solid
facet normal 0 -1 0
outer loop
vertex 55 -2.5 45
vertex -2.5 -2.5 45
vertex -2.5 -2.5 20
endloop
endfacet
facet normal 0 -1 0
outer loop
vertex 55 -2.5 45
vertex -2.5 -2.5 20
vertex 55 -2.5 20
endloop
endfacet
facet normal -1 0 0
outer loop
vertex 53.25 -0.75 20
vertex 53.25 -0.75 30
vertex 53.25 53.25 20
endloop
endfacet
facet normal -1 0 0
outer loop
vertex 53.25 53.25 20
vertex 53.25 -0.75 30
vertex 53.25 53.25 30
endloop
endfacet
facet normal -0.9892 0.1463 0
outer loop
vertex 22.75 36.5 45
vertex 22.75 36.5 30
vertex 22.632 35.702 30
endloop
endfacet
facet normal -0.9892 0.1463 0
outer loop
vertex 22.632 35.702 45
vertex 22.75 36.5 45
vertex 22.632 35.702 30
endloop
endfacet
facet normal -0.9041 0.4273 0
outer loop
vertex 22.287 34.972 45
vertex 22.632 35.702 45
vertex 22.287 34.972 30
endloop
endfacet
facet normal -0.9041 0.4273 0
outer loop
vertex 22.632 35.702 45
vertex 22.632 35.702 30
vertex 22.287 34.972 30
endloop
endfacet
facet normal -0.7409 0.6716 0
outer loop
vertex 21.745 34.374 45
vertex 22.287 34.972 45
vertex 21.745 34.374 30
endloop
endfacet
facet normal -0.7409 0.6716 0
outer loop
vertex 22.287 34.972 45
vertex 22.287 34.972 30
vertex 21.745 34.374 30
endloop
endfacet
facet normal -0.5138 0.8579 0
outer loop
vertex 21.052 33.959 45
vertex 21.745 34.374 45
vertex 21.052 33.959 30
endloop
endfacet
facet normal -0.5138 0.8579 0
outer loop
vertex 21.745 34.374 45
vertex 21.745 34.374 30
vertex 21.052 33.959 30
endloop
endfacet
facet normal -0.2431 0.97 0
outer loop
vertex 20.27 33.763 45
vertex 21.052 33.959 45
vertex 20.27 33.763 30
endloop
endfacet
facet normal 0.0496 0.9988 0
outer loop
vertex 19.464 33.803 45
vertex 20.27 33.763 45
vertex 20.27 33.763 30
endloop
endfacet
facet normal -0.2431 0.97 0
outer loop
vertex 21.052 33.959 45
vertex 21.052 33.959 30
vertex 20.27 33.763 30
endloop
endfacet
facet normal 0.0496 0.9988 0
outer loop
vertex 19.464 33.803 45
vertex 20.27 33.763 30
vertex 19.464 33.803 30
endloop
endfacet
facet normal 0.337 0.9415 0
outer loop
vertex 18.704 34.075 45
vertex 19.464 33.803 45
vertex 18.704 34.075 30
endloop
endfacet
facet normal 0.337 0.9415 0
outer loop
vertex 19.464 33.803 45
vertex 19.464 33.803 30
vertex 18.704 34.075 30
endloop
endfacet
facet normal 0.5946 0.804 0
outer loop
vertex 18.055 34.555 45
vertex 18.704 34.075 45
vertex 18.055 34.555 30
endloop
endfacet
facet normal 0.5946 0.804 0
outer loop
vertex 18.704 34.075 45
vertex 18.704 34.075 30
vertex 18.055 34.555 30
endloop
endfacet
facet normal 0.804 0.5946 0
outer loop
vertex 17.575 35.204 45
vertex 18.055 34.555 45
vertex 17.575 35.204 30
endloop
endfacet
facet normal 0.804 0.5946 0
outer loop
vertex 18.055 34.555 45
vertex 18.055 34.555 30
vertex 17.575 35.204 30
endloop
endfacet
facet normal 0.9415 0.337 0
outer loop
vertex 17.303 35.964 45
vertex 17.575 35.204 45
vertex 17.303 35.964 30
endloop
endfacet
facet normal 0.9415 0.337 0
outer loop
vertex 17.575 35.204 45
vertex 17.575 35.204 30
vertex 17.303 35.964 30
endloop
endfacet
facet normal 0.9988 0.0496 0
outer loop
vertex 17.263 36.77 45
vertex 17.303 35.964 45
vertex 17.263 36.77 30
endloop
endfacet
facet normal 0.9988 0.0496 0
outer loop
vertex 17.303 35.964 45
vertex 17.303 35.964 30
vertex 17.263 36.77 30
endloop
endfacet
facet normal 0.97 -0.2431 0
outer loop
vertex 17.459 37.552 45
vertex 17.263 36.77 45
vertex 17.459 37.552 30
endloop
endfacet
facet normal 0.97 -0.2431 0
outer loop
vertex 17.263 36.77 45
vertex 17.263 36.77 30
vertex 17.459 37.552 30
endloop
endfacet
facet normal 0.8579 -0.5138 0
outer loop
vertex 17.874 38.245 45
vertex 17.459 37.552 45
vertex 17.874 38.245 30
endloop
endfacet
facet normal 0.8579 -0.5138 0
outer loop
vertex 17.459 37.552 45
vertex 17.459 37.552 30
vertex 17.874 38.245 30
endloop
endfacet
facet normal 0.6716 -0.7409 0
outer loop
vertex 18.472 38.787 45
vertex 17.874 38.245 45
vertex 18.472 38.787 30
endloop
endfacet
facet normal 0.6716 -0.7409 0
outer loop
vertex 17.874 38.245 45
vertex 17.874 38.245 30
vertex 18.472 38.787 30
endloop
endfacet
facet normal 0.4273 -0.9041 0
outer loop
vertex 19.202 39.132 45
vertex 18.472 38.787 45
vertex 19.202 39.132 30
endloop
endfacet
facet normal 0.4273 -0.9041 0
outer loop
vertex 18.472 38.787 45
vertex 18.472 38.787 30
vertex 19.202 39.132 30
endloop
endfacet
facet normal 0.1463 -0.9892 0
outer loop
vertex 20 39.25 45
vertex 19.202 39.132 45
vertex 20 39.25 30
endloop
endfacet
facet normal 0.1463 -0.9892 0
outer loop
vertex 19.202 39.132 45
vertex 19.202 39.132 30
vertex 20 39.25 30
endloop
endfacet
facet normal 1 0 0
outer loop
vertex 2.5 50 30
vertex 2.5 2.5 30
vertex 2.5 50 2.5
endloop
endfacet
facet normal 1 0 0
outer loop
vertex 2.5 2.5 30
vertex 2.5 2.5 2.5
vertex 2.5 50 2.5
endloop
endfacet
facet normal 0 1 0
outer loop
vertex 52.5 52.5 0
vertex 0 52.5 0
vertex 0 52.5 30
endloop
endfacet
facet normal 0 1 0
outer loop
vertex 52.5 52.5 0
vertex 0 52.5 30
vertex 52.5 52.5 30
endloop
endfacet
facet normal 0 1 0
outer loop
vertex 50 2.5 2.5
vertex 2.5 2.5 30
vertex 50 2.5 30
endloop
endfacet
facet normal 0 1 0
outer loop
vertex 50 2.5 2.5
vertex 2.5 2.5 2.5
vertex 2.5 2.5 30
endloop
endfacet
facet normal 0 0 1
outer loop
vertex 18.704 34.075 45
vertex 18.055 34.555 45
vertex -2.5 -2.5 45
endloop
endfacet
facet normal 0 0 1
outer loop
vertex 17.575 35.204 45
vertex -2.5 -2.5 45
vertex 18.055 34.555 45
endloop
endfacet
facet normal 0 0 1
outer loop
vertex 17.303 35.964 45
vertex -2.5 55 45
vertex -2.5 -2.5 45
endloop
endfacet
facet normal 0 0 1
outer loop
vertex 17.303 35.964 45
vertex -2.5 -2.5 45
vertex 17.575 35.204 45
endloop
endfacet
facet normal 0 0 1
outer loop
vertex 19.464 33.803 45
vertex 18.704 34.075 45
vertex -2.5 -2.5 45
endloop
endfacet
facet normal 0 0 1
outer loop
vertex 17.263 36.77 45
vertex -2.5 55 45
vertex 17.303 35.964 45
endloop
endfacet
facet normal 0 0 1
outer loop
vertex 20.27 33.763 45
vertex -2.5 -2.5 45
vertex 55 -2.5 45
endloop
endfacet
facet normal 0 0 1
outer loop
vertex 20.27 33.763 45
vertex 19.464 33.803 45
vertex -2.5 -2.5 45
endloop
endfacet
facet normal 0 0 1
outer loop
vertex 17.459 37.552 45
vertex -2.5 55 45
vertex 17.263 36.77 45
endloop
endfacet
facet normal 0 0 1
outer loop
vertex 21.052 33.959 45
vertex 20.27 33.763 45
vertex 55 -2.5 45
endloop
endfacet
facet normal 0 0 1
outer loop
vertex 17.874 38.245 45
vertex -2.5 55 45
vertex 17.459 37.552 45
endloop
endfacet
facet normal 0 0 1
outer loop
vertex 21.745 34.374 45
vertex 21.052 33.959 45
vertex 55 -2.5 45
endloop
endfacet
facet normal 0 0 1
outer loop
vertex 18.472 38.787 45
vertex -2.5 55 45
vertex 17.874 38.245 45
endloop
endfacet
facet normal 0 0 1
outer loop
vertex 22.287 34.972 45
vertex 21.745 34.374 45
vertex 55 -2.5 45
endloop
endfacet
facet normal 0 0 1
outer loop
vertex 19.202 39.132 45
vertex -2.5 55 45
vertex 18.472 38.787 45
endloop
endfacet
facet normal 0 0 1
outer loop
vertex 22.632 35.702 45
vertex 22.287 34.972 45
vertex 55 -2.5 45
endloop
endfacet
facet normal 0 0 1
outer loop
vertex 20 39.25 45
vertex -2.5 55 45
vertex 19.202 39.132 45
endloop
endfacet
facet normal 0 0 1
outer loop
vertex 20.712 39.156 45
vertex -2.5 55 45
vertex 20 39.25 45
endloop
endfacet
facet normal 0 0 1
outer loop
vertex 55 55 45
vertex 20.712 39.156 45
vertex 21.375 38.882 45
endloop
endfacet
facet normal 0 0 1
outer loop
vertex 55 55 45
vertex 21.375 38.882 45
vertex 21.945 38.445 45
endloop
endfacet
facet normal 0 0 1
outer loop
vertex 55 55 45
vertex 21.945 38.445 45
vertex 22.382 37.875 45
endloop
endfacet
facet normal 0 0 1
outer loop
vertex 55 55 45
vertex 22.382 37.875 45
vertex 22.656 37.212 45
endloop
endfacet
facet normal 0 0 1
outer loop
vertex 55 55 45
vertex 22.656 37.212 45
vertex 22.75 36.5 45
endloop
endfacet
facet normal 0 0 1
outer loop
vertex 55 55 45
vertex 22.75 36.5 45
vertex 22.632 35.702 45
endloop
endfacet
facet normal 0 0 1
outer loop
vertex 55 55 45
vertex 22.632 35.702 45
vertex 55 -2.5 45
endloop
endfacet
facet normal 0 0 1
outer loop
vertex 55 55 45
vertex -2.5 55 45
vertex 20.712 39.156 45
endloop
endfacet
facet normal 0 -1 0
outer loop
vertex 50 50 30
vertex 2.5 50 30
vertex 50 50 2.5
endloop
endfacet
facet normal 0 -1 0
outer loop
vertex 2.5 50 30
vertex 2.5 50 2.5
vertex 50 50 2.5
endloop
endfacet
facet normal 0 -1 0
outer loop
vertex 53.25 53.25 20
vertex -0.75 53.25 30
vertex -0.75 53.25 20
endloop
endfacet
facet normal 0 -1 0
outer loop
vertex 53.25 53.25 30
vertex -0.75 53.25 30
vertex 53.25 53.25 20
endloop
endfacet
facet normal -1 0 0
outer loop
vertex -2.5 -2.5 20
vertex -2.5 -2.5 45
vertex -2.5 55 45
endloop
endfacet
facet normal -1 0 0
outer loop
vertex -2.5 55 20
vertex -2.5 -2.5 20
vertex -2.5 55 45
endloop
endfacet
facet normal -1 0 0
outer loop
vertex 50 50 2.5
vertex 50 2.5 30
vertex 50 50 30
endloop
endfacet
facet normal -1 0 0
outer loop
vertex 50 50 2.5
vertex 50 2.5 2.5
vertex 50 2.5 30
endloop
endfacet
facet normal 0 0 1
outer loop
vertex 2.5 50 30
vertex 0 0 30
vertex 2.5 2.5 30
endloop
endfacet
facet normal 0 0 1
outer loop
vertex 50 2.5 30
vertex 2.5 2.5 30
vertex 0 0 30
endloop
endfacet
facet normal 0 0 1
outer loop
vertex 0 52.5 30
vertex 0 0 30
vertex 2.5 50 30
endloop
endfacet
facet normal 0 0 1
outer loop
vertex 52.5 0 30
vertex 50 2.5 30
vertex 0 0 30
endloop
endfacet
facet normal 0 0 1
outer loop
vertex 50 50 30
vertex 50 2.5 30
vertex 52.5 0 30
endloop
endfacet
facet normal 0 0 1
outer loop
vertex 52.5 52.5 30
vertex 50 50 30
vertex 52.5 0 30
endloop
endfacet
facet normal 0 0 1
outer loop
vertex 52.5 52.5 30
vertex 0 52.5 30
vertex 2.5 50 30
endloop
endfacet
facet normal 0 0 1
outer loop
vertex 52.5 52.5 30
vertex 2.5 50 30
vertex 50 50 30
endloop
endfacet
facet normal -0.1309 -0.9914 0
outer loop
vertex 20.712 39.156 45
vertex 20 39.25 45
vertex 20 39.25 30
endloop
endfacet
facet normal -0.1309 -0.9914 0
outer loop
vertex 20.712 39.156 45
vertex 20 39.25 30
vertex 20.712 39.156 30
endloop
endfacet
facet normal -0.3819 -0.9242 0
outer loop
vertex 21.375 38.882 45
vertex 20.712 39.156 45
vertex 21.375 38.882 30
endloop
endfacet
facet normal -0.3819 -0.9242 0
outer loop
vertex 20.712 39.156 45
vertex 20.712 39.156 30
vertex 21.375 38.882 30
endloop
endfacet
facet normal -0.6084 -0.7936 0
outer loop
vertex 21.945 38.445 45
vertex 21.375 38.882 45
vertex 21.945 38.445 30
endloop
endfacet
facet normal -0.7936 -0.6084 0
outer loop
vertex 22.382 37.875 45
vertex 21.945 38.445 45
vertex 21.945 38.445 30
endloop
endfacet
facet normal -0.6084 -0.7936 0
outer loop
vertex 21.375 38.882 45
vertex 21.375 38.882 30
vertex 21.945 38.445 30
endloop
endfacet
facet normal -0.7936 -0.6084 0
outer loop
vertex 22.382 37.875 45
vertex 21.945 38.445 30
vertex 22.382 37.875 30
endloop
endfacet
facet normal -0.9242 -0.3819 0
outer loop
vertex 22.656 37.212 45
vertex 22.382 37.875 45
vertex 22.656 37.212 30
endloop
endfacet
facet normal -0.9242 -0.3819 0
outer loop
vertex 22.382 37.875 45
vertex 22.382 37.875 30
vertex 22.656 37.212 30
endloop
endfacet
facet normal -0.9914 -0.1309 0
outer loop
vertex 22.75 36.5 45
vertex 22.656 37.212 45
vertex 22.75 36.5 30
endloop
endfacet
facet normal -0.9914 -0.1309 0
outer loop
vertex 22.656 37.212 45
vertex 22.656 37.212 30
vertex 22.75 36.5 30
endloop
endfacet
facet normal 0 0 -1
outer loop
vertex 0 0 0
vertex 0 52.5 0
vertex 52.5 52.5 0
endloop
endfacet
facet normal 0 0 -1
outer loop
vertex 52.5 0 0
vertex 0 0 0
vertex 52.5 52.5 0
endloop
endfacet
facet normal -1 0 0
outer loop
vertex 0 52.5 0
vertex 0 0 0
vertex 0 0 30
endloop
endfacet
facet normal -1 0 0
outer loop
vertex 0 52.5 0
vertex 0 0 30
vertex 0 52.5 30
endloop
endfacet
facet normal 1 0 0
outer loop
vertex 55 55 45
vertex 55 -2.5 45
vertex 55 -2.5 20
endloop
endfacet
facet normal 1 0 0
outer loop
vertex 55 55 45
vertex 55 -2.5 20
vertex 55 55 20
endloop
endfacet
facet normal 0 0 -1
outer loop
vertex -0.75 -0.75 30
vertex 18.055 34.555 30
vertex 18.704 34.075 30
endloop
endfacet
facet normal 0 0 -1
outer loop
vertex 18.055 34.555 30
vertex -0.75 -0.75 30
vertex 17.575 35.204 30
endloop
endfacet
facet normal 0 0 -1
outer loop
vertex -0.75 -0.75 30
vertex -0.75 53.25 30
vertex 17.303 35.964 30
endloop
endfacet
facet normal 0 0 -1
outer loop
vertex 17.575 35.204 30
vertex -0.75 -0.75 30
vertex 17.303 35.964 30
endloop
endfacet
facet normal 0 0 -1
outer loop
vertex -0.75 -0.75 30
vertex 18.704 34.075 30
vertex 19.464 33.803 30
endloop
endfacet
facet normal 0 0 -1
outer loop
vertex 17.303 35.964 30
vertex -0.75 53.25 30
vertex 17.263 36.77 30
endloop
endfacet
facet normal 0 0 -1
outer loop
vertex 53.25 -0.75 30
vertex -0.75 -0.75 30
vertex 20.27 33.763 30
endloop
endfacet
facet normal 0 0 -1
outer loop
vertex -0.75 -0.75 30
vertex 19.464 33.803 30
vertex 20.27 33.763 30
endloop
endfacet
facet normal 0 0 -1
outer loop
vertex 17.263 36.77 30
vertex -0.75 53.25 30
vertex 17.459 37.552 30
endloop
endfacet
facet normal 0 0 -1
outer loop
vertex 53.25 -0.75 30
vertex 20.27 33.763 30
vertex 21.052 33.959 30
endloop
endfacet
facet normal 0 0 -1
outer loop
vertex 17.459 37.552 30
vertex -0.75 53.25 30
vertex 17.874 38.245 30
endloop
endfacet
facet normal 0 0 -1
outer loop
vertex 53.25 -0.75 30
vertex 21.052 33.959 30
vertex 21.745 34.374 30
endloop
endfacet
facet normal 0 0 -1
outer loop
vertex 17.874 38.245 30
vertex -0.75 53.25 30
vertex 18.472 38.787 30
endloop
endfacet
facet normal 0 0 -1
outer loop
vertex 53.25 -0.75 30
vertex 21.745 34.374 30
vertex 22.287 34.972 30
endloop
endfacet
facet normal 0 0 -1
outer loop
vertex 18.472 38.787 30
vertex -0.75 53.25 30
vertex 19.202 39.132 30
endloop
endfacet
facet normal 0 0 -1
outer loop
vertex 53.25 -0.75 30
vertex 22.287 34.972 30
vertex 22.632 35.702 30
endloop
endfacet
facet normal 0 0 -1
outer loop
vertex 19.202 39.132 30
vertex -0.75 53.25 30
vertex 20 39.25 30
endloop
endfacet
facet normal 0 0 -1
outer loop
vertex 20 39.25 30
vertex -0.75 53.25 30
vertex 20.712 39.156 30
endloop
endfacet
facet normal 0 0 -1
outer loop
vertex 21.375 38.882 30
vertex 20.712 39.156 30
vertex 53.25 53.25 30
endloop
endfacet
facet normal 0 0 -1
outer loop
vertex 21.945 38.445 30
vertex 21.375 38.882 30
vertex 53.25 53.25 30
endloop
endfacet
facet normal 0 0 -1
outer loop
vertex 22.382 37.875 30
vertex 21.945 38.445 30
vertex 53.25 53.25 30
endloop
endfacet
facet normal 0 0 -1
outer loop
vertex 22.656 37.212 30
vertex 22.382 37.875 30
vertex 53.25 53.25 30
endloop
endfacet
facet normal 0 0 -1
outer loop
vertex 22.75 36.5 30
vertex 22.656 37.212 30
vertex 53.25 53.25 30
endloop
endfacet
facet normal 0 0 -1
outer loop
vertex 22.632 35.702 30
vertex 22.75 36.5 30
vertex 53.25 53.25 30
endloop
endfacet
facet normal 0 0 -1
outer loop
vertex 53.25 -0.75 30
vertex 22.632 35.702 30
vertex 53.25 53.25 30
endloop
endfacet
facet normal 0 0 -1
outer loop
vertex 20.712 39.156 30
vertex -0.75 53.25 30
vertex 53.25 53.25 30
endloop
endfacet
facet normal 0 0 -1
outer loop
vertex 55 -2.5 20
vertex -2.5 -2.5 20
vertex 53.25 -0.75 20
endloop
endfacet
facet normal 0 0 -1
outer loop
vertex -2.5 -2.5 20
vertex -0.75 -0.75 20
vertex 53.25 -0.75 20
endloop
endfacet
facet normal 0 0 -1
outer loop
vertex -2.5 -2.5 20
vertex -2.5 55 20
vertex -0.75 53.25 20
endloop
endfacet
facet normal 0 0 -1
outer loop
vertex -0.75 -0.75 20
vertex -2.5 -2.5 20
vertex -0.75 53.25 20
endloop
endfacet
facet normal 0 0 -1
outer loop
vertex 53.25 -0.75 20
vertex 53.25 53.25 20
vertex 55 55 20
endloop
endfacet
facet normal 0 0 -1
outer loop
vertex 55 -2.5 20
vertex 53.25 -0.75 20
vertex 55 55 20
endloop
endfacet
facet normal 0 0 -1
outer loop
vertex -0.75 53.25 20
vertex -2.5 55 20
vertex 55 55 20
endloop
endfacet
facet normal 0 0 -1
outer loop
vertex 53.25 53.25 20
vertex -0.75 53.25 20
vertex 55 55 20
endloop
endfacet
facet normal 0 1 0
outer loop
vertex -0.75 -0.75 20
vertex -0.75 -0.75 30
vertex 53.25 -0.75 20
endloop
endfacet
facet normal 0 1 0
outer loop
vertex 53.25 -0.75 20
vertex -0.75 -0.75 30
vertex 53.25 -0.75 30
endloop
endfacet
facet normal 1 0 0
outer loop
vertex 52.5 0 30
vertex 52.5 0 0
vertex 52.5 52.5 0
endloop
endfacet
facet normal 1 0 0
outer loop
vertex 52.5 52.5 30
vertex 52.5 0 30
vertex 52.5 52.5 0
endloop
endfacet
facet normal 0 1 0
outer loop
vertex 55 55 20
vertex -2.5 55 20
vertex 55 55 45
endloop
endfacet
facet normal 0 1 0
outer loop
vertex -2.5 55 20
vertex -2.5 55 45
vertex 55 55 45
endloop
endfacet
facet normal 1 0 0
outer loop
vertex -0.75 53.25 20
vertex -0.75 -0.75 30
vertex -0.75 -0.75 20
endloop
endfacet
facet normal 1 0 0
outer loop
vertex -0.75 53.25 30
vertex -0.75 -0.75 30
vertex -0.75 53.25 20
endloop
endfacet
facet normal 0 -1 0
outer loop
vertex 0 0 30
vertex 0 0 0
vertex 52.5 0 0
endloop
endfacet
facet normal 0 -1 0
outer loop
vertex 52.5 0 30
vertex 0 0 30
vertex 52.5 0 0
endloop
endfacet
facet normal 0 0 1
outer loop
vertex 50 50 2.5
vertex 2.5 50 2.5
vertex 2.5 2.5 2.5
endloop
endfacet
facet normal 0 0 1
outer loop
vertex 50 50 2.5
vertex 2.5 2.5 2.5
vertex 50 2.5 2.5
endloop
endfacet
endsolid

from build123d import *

# Parameters (mm, degrees)
F0_W     = 52.5
F0_H     = 52.5
F1_DEPTH = 30
F2_T     = -2.5
F3_W     = 57.5
F3_H     = 57.5
F3_W_2   = 54
F3_H_2   = 54
F4_DEPTH = 15
F5_DEPTH = 10


with BuildPart() as f1:
    # F0 (on Top) → F1 (new body)
    with BuildSketch(Plane.XY):
        with Locations((26.25, 26.25)):
            Rectangle(F0_W, F0_H)
    extrude(amount=F1_DEPTH)

    # F2
    f2_openings = [f1.faces().sort_by_distance(p)[0] for p in [
        (26.25, 26.25, 30),
    ]]
    offset(amount=F2_T, openings=f2_openings)


with BuildPart() as f4:
    # F3 (on face) → F4 (new body)
    with BuildSketch(Plane.XY.offset(30)):
        with BuildLine():
            ThreePointArc((22.75, 36.5), (21.944544, 38.444544), (20, 39.25))
            ThreePointArc((20, 39.25), (18.055456, 34.555456), (22.75, 36.5))
        make_face()
        with Locations((26.25, 26.25)):
            Rectangle(F3_W, F3_H)
        with Locations((26.25, 26.25)):
            Rectangle(F3_W_2, F3_H_2, mode=Mode.SUBTRACT)
        with Locations((26.25, 26.25)):
            Rectangle(F3_W_2, F3_H_2)
        Polygon((2.5, 2.5), (2.5, 50), (20, 50), (50, 50), (50, 2.5), align=None, mode=Mode.SUBTRACT)
        Polygon((20, 50), (2.5, 50), (2.5, 2.5), (50, 2.5), (50, 50), align=None)
        with BuildLine():
            ThreePointArc((22.75, 36.5), (18.055456, 34.555456), (20, 39.25))
            ThreePointArc((20, 39.25), (21.944544, 38.444544), (22.75, 36.5))
        make_face(mode=Mode.SUBTRACT)
    extrude(amount=F4_DEPTH)

    # F3 (on face) → F5 (join)
    with BuildSketch(Plane.XY.offset(30)):
        with Locations((26.25, 26.25)):
            Rectangle(F3_W, F3_H)
        with Locations((26.25, 26.25)):
            Rectangle(F3_W_2, F3_H_2, mode=Mode.SUBTRACT)
    extrude(amount=-F5_DEPTH)


solid = Compound([f1.part, f4.part])
